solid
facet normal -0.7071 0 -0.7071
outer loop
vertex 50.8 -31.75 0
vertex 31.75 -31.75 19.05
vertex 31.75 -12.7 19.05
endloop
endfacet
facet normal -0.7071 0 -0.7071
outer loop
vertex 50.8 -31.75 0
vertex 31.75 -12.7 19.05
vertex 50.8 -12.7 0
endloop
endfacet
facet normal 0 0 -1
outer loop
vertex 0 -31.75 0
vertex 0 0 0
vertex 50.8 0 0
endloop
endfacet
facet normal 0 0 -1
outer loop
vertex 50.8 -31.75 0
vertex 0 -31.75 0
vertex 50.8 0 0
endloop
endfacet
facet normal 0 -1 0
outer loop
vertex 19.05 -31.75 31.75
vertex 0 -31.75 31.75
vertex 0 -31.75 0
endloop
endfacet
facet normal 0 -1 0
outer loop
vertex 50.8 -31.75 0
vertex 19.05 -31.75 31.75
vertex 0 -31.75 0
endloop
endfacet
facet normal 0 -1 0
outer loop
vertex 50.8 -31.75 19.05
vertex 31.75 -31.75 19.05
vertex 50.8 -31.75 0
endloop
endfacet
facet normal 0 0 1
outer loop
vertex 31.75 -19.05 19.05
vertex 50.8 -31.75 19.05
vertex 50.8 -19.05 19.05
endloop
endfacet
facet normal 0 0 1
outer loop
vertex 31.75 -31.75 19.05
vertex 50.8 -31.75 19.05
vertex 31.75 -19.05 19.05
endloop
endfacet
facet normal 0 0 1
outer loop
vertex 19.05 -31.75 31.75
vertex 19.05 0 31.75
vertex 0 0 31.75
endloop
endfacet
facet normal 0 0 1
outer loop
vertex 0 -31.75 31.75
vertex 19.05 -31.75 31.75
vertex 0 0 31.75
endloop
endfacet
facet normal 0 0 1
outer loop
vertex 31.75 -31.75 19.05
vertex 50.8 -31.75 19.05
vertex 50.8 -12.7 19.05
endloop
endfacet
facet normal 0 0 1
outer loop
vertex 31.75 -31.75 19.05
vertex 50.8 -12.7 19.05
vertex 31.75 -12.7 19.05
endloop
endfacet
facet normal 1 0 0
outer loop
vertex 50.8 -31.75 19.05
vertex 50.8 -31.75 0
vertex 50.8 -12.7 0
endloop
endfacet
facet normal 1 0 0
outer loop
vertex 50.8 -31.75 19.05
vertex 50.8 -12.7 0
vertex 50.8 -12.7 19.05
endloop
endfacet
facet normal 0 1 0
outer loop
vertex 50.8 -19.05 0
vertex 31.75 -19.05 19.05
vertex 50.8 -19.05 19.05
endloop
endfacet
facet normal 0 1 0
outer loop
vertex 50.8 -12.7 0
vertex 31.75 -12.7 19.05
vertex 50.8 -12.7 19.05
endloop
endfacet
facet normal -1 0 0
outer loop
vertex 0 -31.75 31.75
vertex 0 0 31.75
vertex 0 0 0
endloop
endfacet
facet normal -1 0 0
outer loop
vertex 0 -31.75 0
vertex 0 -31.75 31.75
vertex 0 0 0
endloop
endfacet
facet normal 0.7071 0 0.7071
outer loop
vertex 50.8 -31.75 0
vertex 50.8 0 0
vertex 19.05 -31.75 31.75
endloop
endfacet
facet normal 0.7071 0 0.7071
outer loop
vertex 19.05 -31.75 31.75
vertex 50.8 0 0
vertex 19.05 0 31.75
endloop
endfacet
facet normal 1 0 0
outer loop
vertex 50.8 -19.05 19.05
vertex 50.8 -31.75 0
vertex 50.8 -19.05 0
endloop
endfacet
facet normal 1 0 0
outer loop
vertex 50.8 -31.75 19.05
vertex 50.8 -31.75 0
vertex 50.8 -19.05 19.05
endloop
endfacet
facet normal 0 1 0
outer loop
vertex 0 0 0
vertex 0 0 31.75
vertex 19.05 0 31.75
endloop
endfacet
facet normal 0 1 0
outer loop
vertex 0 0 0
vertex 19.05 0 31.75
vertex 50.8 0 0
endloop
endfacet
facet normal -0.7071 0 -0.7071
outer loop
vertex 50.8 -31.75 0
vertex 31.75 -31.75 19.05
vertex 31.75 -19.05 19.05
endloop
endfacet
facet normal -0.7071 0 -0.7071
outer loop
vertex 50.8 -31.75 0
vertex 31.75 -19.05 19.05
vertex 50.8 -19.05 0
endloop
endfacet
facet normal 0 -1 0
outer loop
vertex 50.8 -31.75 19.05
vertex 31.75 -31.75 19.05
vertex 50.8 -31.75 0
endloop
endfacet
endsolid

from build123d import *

# Parameters (mm, degrees)
F1_DEPTH = 31.75
F3_DEPTH = 19.05
F5_DEPTH = 12.7


with BuildPart() as f1:
    # F0 (on Front) → F1 (new body)
    with BuildSketch(Plane.XZ):
        Polygon((19.05, 31.75), (0, 31.75), (0, 0), (50.8, 0), align=None)
    extrude(amount=F1_DEPTH)


with BuildPart() as f3:
    # F2 (on face) → F3 (new body)
    with BuildSketch(Plane.XZ.offset(31.75)):
        Polygon((50.8, 19.05), (31.75, 19.05), (50.8, 0), align=None)
    extrude(amount=-F3_DEPTH)


with BuildPart() as f5:
    # F4 (on face) → F5 (new body)
    with BuildSketch(Plane.XZ.offset(31.75)):
        Polygon((50.8, 19.05), (31.75, 19.05), (50.8, 0), align=None)
    extrude(amount=-F5_DEPTH)


solid = Compound([f1.part, f3.part, f5.part])
